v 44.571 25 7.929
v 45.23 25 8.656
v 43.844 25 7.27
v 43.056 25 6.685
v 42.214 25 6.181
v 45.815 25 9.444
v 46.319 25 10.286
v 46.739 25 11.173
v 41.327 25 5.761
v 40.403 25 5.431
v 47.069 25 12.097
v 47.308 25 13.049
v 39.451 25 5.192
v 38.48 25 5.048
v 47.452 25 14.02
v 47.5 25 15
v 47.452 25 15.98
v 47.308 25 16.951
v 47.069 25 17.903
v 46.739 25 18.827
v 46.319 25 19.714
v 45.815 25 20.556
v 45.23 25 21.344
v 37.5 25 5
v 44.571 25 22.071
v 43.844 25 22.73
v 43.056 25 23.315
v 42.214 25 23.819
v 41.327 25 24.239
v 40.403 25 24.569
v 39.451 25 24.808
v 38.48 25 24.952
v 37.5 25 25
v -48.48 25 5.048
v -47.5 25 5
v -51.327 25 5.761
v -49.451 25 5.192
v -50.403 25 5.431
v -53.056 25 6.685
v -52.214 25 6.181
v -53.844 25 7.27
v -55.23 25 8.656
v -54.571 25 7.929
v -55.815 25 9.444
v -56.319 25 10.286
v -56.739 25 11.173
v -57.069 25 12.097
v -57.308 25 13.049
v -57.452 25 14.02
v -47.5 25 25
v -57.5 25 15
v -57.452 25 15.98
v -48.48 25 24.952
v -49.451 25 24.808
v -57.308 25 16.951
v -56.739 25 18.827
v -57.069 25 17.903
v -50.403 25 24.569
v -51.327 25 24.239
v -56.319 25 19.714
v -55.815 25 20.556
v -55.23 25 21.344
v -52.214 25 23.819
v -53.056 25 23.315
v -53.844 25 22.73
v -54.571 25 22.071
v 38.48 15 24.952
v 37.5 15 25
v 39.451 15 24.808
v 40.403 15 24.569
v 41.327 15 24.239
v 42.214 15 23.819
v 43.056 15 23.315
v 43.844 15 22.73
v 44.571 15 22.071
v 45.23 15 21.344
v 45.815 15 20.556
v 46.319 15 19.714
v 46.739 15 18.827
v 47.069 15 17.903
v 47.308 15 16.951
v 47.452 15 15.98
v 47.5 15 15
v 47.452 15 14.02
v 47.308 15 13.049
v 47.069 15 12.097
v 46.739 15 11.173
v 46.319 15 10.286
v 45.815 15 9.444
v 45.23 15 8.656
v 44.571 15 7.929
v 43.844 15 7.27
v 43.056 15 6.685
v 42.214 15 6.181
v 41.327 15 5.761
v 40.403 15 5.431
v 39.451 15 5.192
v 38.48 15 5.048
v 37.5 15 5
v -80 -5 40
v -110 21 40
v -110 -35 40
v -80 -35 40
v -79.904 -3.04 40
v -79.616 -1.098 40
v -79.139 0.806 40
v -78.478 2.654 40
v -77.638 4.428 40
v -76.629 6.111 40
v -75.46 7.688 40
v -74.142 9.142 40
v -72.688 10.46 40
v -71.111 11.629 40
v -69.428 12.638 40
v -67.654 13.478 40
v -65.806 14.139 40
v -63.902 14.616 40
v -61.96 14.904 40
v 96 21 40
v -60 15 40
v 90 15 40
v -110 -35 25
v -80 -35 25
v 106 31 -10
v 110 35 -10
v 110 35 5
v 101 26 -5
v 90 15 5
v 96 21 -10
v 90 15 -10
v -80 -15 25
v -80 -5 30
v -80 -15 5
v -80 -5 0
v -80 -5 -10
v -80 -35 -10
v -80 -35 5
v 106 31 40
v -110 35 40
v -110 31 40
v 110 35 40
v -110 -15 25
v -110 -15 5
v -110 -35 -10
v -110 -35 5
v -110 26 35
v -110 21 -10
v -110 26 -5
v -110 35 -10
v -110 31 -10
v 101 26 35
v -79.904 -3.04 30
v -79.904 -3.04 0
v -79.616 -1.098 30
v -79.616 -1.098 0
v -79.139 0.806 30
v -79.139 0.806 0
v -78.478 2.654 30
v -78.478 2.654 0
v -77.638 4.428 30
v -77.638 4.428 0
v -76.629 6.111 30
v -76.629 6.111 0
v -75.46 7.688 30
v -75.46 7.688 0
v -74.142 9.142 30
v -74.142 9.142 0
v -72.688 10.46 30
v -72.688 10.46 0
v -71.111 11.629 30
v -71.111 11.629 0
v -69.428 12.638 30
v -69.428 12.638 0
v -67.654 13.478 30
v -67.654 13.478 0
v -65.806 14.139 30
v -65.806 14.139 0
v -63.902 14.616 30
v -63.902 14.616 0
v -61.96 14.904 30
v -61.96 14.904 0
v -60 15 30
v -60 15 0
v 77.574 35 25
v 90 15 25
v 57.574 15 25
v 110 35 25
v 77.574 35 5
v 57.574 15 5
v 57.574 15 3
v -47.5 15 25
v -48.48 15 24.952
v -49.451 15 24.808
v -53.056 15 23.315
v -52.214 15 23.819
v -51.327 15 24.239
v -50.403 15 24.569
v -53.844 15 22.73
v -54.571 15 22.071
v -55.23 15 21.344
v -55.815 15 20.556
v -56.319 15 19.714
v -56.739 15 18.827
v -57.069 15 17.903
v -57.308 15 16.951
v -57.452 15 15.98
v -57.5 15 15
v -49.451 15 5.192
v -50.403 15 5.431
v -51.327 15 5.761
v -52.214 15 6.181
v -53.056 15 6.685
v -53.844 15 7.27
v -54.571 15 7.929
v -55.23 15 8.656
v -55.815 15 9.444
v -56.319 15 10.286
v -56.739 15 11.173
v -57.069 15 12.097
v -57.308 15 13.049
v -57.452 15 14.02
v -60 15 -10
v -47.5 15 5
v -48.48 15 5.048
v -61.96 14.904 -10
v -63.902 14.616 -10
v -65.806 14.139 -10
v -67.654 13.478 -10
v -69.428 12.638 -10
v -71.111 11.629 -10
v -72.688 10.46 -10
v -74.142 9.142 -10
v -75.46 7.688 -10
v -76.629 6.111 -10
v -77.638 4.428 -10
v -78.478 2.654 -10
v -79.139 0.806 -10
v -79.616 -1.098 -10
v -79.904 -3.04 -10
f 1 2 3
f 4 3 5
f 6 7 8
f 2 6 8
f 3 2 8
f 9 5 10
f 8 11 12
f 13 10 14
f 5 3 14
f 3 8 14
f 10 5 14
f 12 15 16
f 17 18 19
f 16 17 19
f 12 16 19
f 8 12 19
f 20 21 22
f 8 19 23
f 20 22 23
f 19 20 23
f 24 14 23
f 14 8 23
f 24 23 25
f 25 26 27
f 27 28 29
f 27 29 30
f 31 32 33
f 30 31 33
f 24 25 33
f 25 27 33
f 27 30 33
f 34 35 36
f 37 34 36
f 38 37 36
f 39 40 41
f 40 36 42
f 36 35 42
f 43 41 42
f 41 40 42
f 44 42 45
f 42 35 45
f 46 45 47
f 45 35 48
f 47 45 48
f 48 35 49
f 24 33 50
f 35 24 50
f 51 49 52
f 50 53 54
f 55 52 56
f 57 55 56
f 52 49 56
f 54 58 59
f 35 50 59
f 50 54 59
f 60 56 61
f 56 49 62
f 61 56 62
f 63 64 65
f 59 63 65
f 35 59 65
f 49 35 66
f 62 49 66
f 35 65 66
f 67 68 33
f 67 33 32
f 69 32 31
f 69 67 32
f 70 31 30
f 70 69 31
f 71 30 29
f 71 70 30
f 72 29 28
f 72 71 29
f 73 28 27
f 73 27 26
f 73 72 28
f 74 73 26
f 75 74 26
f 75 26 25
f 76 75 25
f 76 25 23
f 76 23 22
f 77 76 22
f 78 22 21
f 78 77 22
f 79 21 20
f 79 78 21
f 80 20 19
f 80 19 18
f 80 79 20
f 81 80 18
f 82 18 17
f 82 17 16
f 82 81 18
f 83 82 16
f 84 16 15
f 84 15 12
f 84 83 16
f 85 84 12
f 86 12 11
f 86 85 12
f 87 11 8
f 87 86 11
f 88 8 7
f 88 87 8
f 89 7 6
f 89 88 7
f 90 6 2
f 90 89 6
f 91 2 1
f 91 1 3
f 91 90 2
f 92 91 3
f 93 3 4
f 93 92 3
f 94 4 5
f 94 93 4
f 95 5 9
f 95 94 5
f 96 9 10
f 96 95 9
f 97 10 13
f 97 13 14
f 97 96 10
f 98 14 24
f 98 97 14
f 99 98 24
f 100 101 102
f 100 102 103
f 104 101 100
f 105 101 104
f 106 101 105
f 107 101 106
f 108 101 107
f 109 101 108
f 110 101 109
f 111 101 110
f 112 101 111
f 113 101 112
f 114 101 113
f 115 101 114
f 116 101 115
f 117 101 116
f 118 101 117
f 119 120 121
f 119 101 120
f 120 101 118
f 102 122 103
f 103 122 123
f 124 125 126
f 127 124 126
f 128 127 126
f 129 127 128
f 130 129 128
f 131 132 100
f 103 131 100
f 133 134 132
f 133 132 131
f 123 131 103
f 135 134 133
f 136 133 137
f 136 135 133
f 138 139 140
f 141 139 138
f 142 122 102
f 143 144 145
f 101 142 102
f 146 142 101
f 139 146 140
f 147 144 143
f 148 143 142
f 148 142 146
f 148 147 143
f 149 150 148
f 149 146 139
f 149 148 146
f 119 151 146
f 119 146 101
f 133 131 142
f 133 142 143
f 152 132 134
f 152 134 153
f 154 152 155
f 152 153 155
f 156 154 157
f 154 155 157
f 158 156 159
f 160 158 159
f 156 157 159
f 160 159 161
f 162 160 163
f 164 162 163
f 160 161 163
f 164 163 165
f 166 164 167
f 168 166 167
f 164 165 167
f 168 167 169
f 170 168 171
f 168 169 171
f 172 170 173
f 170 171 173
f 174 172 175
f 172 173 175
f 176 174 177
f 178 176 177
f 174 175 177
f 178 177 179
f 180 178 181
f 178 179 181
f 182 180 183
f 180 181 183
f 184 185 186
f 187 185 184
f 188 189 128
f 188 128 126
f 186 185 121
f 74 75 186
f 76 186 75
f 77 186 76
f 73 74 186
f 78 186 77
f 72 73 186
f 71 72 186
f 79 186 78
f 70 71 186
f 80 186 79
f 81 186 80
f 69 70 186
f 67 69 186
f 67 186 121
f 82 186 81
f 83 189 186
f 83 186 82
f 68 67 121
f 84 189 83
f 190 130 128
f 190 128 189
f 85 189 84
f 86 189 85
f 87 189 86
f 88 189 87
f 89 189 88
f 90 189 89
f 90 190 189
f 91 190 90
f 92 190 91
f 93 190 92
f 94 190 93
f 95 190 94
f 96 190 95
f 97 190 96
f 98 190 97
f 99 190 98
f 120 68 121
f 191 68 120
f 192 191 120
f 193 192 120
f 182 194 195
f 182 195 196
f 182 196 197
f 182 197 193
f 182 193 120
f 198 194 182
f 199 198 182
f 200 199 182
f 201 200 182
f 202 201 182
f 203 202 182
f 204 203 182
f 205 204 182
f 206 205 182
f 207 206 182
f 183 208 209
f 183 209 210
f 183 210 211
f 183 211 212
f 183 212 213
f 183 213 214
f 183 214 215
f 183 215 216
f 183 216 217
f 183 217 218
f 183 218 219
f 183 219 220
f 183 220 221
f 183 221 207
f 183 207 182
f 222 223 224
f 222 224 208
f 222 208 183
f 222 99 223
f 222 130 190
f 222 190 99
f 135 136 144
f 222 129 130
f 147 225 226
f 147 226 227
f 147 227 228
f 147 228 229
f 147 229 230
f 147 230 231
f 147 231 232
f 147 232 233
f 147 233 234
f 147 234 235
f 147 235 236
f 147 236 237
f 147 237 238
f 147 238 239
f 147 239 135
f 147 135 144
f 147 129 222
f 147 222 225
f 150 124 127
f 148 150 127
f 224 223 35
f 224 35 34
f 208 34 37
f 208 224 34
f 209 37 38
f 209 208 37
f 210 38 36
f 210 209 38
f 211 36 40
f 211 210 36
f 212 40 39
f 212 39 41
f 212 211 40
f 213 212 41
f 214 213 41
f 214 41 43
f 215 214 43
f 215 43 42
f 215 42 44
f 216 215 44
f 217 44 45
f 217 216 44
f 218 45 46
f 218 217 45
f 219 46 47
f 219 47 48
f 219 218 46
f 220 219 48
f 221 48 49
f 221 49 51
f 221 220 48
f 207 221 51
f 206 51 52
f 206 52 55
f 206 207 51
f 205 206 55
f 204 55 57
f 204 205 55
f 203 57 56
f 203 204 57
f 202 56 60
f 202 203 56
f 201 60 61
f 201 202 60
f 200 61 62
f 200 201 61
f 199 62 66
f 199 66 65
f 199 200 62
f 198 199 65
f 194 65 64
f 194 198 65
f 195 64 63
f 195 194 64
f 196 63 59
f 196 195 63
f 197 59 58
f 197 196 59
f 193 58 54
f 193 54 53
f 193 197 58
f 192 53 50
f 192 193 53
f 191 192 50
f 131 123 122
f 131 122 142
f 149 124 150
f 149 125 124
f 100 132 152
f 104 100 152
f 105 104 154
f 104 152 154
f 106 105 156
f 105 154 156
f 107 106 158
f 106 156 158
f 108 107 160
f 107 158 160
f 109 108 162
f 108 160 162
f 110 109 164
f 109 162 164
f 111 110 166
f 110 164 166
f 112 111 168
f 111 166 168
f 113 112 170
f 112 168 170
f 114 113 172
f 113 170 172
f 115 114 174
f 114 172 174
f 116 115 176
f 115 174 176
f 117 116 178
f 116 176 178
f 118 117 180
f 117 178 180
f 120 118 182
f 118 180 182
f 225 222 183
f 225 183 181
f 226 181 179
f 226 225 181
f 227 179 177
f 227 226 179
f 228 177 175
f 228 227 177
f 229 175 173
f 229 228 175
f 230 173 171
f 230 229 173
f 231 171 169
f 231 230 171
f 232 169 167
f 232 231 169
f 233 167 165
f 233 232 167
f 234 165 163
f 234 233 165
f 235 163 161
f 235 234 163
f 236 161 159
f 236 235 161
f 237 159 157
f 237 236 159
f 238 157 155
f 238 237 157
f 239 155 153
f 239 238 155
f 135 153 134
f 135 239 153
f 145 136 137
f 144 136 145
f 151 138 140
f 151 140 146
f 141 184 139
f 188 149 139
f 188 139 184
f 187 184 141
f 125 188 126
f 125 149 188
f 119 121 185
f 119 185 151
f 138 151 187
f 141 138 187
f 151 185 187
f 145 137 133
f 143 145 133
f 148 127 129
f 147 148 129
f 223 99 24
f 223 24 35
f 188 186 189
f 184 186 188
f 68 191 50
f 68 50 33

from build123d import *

# Parameters (mm, degrees)
SKETCH_1_W          = 220
SKETCH_1_H          = 70
EXTRUDE_1_DEPTH     = 30
SKETCH_2_W          = 190
SKETCH_2_H          = 50
CUT_EXTRUDE_1_DEPTH = 30
SKETCH_3_W          = 20
SKETCH_3_H          = 40
CUT_EXTRUDE_2_DEPTH = 30
CUT_EXTRUDE_3_DEPTH = 30
SKETCH_5_W          = 20
SKETCH_5_H          = 60
CUT_EXTRUDE_4_DEPTH = 30
SKETCH_6_W          = 20
SKETCH_6_H          = 20
CUT_EXTRUDE_5_DEPTH = 30
SKETCH_7_W          = 20
SKETCH_7_H          = 20
CUT_EXTRUDE_6_DEPTH = 10
FILLET_1_R          = 20
EXTRUDE_2_DEPTH     = 22
EXTRUDE_3_DEPTH     = 10
EXTRUDE_START       = 10
EXTRUDE_4_DEPTH     = 10
CUT_EXTRUDE_7_DEPTH = 10
CUT_EXTRUDE_8_DEPTH = 299


with BuildPart() as part:
    # 草图1 → 凸台-拉伸1 (new body)
    with BuildSketch(Plane.XY):
        Rectangle(SKETCH_1_W, SKETCH_1_H)
    extrude(amount=EXTRUDE_1_DEPTH)

    # 草图2 → 切除-拉伸1 (cut)
    with BuildSketch(Plane.XY.offset(30)):
        with Locations((15, -10)):
            Rectangle(SKETCH_2_W, SKETCH_2_H)
    extrude(amount=-CUT_EXTRUDE_1_DEPTH, mode=Mode.SUBTRACT)

    # 草图3 → 切除-拉伸2 (cut)
    with BuildSketch(Plane(origin=(-80, 0, 0), x_dir=(0, 0, -1), z_dir=(1, 0, 0))):
        with Locations((-15, -35)):
            Rectangle(SKETCH_3_W, SKETCH_3_H)
    extrude(amount=-CUT_EXTRUDE_2_DEPTH, mode=Mode.SUBTRACT)

    # 草图4 → 切除-拉伸3 (cut)
    with BuildSketch(Plane.XY.offset(30)):
        Polygon((110, 35), (90, 15), (110, 15), align=None)
    extrude(amount=-CUT_EXTRUDE_3_DEPTH, mode=Mode.SUBTRACT)

    # 草图5 → 切除-拉伸4 (cut)
    with BuildSketch(Plane(origin=(37.5, -37.5, 0), x_dir=(0, 0, -1), z_dir=(0.7071067811865536, -0.7071067811865415, 0))):
        with Locations((-15, 102.530483272)):
            Rectangle(SKETCH_5_W, SKETCH_5_H)
    extrude(amount=-CUT_EXTRUDE_4_DEPTH, mode=Mode.SUBTRACT)

    # 草图6 → 切除-拉伸5 (cut)
    with BuildSketch(Plane(origin=(0, 35, 0), x_dir=(1, 0, 0), z_dir=(0, 1, 0))):
        with Locations((77.573593129, -15)):
            Rectangle(SKETCH_6_W, SKETCH_6_H)
    extrude(amount=-CUT_EXTRUDE_5_DEPTH, mode=Mode.SUBTRACT)

    # 草图7 → 切除-拉伸6 (cut)
    with BuildSketch(Plane(origin=(67.573593129, 0, 0), x_dir=(0, 0, -1), z_dir=(1, 0, 0))):
        with Locations((-15, 25)):
            Rectangle(SKETCH_7_W, SKETCH_7_H)
    extrude(amount=-CUT_EXTRUDE_6_DEPTH, mode=Mode.SUBTRACT)

    # 圆角1
    fillet_1_edges = [part.edges().sort_by_distance(p)[0] for p in [
        (-80, 15, 15),
    ]]
    fillet(fillet_1_edges, radius=FILLET_1_R)

    # 草图8 → 凸台-拉伸2 (add)
    with BuildSketch(Plane(origin=(0, 0, 25), x_dir=(-1, 0, 0), z_dir=(0, 0, -1))):
        Polygon((-57.573593129, 15), (-77.573593129, 35), (-57.573593129, 35), align=None)
    extrude(amount=EXTRUDE_2_DEPTH)

    # 草图9 → 凸台-拉伸3 (add)
    with BuildSketch(Plane.XY.offset(30)):
        with BuildLine():
            Line((90, 15), (110, 35))
            Line((110, 35), (-110, 35))
            Line((-110, 35), (-110, -35))
            Line((-110, -35), (-80, -35))
            Line((-80, -35), (-80, -5))
            ThreePointArc((-80, -5), (-74.142135624, 9.142135624), (-60, 15))
            Line((-60, 15), (90, 15))
        make_face()
    extrude(amount=EXTRUDE_3_DEPTH)

    # 草图10 → 凸台-拉伸4 (add)
    with BuildSketch(Plane(origin=(0, 0, 0), x_dir=(-1, 0, 0), z_dir=(0, 0, -1)).offset(EXTRUDE_START)):
        with BuildLine():
            Line((110, 35), (-110, 35))
            Line((-110, 35), (-90, 15))
            Line((-90, 15), (60, 15))
            ThreePointArc((60, 15), (74.142135624, 9.142135624), (80, -5))
            Line((80, -5), (80, -35))
            Line((80, -35), (110, -35))
            Line((110, -35), (110, 35))
        make_face()
    extrude(amount=-EXTRUDE_4_DEPTH)

    # 草图11 → 切除-拉伸7 (cut)
    with BuildSketch(Plane.XZ.offset(-15)):
        with BuildLine():
            Line((-47.5, 25), (37.5, 25))
            ThreePointArc((37.5, 25), (47.5, 15), (37.5, 5))
            Line((37.5, 5), (-47.5, 5))
            ThreePointArc((-47.5, 5), (-57.5, 15), (-47.5, 25))
        make_face()
    extrude(amount=-CUT_EXTRUDE_7_DEPTH, mode=Mode.SUBTRACT)

    # 草图12 → 切除-拉伸8 (cut)
    with BuildSketch(Plane.ZY.offset(110)):
        Polygon((-10, 31), (-5, 26), (-10, 21), align=None)
        Polygon((40, 31), (35, 26), (40, 21), align=None)
    extrude(amount=-CUT_EXTRUDE_8_DEPTH, mode=Mode.SUBTRACT)


solid = part.part
